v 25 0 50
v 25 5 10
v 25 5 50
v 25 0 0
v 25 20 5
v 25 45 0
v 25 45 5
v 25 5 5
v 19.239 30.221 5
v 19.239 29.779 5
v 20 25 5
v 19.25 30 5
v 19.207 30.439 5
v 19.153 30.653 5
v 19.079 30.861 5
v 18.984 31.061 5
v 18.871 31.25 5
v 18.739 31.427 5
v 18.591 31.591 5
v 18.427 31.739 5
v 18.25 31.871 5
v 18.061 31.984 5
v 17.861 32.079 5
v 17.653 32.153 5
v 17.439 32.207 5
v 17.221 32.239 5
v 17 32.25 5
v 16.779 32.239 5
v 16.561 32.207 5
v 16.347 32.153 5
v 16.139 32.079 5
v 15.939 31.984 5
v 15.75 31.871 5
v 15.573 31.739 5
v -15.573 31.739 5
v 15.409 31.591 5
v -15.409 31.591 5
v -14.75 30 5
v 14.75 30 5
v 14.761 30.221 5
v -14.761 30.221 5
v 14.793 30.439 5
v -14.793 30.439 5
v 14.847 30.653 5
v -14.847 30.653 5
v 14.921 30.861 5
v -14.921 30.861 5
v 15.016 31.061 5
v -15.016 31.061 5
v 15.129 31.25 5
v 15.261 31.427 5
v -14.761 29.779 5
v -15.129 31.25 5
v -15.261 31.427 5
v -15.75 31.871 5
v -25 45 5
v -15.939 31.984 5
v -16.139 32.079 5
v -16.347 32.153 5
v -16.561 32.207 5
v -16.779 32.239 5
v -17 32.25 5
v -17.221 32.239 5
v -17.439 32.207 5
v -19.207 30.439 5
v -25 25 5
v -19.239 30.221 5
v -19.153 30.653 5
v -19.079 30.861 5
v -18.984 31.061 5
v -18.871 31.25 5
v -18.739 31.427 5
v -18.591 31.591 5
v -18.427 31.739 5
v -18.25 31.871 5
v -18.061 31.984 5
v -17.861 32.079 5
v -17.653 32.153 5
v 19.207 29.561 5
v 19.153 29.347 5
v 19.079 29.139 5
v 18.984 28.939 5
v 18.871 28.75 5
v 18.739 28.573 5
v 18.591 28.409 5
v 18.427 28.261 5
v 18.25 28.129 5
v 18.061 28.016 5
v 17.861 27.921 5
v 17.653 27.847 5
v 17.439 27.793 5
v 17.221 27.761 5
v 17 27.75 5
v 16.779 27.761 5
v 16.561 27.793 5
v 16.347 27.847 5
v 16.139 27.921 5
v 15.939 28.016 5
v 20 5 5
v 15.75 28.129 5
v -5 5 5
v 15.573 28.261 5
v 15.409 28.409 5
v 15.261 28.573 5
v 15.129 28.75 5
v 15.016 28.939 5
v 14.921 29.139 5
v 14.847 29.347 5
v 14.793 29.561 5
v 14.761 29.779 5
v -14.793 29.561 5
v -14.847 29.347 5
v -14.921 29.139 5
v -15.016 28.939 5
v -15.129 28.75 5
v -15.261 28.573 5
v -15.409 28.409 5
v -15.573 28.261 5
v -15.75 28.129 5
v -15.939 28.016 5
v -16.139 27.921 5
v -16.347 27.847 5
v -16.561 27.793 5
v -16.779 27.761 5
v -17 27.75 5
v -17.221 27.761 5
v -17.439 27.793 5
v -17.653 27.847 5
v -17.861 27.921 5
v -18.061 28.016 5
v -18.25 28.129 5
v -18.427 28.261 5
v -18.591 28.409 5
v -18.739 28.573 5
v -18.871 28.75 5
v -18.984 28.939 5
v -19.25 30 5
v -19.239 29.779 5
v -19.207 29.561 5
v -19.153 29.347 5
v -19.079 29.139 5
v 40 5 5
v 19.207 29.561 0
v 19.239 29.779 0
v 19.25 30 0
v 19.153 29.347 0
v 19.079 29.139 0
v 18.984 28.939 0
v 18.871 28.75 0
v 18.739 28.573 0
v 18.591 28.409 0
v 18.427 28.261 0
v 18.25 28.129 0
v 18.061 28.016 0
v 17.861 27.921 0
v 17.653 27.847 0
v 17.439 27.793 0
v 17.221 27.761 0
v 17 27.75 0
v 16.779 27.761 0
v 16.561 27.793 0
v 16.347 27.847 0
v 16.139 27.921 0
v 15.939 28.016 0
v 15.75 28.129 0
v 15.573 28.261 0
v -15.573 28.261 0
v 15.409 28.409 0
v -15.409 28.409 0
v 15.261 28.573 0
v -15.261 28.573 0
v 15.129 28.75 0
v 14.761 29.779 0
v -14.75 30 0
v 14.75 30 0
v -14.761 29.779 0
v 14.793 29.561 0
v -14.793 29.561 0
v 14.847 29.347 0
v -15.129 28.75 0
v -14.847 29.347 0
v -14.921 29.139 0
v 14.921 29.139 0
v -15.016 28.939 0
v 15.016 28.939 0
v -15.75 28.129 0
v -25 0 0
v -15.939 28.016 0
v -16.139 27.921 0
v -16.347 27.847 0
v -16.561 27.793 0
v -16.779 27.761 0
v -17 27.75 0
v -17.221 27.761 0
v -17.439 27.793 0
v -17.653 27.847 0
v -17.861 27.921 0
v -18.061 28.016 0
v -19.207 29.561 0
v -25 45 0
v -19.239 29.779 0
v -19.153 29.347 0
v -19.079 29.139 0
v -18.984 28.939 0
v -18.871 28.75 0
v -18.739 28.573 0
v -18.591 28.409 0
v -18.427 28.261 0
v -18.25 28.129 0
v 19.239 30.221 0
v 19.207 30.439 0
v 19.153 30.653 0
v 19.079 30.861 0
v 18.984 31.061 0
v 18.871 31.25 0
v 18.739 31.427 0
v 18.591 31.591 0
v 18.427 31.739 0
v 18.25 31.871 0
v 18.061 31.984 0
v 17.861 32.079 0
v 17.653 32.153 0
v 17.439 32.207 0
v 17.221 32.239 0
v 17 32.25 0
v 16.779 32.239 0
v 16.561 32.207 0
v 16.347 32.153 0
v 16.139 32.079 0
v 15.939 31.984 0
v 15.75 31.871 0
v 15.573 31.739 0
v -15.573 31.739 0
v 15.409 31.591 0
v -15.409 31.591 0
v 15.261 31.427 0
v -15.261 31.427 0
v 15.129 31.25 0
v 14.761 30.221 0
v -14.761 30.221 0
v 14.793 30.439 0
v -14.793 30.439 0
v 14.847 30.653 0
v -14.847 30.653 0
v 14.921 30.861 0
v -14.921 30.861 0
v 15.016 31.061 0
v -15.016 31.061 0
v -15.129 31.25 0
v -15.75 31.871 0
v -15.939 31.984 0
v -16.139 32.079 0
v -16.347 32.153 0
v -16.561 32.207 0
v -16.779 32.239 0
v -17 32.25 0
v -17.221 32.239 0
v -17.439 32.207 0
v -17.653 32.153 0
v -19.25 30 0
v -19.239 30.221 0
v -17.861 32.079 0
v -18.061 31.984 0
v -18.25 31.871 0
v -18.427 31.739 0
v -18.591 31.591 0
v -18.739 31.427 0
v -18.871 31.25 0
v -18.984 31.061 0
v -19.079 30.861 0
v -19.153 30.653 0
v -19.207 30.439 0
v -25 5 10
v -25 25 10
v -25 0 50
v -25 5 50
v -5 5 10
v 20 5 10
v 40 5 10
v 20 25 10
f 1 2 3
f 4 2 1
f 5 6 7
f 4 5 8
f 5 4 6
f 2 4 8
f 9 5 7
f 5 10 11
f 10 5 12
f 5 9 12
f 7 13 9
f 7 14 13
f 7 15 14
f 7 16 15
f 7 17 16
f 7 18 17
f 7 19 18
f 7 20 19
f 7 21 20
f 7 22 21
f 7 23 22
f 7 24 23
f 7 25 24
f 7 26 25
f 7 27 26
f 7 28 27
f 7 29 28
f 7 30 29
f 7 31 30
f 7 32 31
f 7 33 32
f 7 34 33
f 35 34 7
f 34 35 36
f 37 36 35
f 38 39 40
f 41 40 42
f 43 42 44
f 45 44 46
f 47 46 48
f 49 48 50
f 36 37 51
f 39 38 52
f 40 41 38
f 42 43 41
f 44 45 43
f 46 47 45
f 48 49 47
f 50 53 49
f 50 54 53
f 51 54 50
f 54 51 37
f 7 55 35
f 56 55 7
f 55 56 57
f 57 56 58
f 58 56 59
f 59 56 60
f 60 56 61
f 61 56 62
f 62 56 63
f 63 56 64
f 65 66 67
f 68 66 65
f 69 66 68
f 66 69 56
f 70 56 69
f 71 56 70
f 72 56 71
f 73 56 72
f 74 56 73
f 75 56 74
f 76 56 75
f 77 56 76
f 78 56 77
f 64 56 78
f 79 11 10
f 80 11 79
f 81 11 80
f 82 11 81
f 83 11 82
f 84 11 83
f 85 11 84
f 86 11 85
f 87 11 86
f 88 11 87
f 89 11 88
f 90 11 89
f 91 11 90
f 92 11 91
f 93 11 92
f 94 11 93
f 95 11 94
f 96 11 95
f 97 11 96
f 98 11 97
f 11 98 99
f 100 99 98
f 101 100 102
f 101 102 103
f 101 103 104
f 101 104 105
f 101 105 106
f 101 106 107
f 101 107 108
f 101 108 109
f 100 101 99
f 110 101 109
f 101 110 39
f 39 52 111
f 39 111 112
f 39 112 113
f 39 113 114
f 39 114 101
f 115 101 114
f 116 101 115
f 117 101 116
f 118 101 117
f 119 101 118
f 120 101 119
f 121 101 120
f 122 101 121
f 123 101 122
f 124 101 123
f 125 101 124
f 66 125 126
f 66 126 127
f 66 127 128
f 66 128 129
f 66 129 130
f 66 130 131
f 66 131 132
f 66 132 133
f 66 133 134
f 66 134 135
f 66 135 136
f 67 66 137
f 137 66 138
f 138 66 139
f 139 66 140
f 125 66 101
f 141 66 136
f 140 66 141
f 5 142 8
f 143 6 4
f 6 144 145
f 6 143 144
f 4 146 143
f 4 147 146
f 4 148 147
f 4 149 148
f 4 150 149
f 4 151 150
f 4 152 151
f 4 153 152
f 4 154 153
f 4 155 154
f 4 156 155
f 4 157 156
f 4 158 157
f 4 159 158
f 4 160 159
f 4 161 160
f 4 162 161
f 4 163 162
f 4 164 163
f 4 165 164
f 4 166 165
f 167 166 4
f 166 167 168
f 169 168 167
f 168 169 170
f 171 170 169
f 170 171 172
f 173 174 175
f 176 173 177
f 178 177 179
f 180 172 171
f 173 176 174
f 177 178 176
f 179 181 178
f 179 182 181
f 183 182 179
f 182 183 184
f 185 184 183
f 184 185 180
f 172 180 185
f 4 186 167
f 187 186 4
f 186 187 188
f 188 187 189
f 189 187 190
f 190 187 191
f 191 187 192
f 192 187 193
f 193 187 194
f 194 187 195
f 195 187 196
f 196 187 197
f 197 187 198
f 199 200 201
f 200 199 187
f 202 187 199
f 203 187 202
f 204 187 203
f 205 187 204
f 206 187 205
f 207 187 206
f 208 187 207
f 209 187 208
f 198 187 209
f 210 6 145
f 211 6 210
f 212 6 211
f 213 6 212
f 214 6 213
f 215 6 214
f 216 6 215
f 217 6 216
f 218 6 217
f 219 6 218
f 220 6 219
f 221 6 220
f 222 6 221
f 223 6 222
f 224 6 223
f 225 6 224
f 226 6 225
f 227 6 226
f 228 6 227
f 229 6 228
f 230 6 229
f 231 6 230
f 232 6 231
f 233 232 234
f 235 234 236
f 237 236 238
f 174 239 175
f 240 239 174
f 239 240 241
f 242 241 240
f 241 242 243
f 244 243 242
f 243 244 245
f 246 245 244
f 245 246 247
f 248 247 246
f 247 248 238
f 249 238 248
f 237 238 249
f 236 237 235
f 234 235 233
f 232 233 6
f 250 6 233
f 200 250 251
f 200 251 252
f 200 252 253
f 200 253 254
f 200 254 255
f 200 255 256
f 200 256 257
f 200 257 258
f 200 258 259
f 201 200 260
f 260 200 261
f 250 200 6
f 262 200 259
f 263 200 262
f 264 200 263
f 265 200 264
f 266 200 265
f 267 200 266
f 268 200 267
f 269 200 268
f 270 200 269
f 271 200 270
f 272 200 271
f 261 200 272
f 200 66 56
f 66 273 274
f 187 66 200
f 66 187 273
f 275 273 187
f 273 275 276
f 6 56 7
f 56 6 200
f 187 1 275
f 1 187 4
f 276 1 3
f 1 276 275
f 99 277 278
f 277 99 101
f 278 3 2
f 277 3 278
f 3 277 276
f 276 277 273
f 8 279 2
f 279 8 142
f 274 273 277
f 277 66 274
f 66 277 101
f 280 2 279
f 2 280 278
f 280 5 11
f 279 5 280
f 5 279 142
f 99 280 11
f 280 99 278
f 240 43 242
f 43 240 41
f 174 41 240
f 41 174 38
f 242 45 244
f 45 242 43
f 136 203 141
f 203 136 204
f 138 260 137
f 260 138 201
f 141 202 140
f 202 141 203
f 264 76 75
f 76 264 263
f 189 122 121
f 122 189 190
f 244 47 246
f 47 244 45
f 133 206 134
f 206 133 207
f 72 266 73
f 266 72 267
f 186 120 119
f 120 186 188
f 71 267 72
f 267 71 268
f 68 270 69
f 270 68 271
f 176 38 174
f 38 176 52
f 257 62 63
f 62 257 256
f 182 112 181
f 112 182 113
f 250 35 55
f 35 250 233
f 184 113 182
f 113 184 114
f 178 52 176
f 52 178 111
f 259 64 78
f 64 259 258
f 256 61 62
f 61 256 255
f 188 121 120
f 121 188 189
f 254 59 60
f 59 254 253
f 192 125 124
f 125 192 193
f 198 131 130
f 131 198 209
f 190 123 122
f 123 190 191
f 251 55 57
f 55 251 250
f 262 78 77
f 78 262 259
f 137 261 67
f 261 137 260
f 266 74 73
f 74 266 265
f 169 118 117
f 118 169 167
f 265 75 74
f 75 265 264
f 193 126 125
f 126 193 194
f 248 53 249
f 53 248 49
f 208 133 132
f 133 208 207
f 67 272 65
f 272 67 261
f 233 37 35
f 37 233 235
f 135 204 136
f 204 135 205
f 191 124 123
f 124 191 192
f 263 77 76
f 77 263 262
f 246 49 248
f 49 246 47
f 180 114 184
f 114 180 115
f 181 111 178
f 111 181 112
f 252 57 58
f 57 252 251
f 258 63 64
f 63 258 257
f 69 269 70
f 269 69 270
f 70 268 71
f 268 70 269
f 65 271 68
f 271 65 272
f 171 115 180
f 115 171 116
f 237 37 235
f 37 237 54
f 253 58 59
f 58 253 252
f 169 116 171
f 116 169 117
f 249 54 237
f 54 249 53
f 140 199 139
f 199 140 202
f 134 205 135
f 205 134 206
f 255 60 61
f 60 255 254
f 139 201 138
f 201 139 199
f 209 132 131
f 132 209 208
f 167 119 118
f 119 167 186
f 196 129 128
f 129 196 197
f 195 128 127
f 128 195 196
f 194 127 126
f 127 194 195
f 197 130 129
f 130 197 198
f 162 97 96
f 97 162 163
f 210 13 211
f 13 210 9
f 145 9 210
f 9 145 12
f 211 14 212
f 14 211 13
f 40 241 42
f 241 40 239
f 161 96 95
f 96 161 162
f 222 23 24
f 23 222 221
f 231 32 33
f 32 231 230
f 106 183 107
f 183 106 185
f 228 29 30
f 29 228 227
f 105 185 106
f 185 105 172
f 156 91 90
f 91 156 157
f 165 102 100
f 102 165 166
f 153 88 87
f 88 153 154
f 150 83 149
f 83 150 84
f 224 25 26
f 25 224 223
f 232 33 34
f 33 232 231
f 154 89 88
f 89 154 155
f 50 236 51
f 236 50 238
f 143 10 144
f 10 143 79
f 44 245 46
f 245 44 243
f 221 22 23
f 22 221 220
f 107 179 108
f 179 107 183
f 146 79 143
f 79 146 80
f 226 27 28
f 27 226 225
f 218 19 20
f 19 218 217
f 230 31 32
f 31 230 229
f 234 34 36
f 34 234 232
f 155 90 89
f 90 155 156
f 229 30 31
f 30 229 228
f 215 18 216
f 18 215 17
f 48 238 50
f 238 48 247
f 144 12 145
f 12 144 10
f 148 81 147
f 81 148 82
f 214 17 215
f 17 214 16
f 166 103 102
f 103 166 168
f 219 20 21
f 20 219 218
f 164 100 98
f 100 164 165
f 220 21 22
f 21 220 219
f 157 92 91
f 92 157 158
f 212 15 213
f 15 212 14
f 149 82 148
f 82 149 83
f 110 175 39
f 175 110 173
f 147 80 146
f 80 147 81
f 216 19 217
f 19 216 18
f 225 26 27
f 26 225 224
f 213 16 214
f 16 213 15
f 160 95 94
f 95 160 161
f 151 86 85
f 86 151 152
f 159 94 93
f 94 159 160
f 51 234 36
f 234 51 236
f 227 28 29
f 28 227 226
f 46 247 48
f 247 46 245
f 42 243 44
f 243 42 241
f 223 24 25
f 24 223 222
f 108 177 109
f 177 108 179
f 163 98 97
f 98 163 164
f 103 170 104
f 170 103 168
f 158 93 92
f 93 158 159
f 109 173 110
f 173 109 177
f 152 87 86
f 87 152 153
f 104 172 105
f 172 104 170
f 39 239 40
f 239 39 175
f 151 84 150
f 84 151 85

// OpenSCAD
// L-shaped NEMA 17 Mounting Bracket for Syringe Pump
// Print orientation: Base plate on XY plane (z=0), building upward (+Z).

// --- Dimensions ---
// Base Plate
base_x_min = -25;
base_x_max = 25;
base_y_min = 0;
base_y_max = 45;
base_z_min = 0;
base_z_max = 5;

// Vertical Motor Plate
motor_x_min = -25;
motor_x_max = 25;
motor_y_min = 0;
motor_y_max = 5;
motor_z_min = 0;
motor_z_max = 50;

// Gussets
gusset_thickness = 5;
gusset_leg_y = 20;
gusset_leg_z = 20;
gusset_x_start_left = -25;
gusset_x_end_left = -20;
gusset_x_start_right = 20;
gusset_x_end_right = 25;

// Holes - Base Plate (M4)
hole_base_dia = 4.5;
hole_base_pos_1 = [-17, 30];
hole_base_pos_2 = [17, 30];

// Holes - Motor Plate (Centering Boss)
hole_boss_dia = 23;
hole_boss_center = [0, 28]; // x, z

// Holes - Motor Plate (M3 Screws)
hole_screw_dia = 3.4;
screw_pattern_size = 31; // Square pattern side length
screw_pattern_center = [0, 28]; // x, z (same as boss)

// --- Rendering Settings ---
$fn = 64;

// --- Main Assembly ---
difference() {
    union() {
        // 1. Base Plate
        translate([
            (base_x_min + base_x_max) / 2,
            (base_y_min + base_y_max) / 2,
            (base_z_min + base_z_max) / 2
        ])
        cube([
            base_x_max - base_x_min,
            base_y_max - base_y_min,
            base_z_max - base_z_min
        ], center = true);

        // 2. Vertical Motor Plate
        translate([
            (motor_x_min + motor_x_max) / 2,
            (motor_y_min + motor_y_max) / 2,
            (motor_z_min + motor_z_max) / 2
        ])
        cube([
            motor_x_max - motor_x_min,
            motor_y_max - motor_y_min,
            motor_z_max - motor_z_min
        ], center = true);

        // 3. Left Gusset
        // Right triangle in YZ plane, right angle at (y=5, z=5)
        // Legs extend +Y and +Z
        translate([gusset_x_start_left, 5, 5])
        linear_extrude(height = gusset_thickness, convexity = 10)
        polygon(points = [
            [0, 0], // Right angle corner (local)
            [gusset_leg_y, 0], // Along +Y
            [0, gusset_leg_z]  // Along +Z
        ]);

        // 4. Right Gusset
        translate([gusset_x_start_right, 5, 5])
        linear_extrude(height = gusset_thickness, convexity = 10)
        polygon(points = [
            [0, 0], // Right angle corner (local)
            [gusset_leg_y, 0], // Along +Y
            [0, gusset_leg_z]  // Along +Z
        ]);
    }

    // --- Cuts ---

    // 5. Base Plate Holes (M4)
    // Extend slightly past z=0 and z=5 to ensure clean cut
    translate([hole_base_pos_1[0], hole_base_pos_1[1], -1])
    cylinder(h = base_z_max + 2, r = hole_base_dia / 2, center = false);

    translate([hole_base_pos_2[0], hole_base_pos_2[1], -1])
    cylinder(h = base_z_max + 2, r = hole_base_dia / 2, center = false);

    // 6. Motor Plate Centering Boss Hole (23mm)
    // Cuts along Y axis. Center at x=0, z=28.
    // Extend past y=0 and y=5
    translate([hole_boss_center[0], -1, hole_boss_center[1]])
    rotate([90, 0, 0]) // Rotate cylinder to align with Y axis
    cylinder(h = motor_y_max + 2, r = hole_boss_dia / 2, center = false);

    // 7. Motor Plate M3 Screw Holes (31mm square pattern)
    // Pattern centered on boss hole (x=0, z=28)
    // Square side 31mm -> offset from center is 31/2 = 15.5mm
    screw_offset = screw_pattern_size / 2;
    
    // Four corners of the square pattern
    screw_positions = [
        [screw_pattern_center[0] - screw_offset, screw_pattern_center[1] - screw_offset], // Bottom Left
        [screw_pattern_center[0] + screw_offset, screw_pattern_center[1] - screw_offset], // Bottom Right
        [screw_pattern_center[0] - screw_offset, screw_pattern_center[1] + screw_offset], // Top Left
        [screw_pattern_center[0] + screw_offset, screw_pattern_center[1] + screw_offset]  // Top Right
    ];

    for (pos = screw_positions) {
        // pos[0] is x, pos[1] is z
        translate([pos[0], -1, pos[1]])
        rotate([90, 0, 0]) // Rotate cylinder to align with Y axis
        cylinder(h = motor_y_max + 2, r = hole_screw_dia / 2, center = false);
    }
}
